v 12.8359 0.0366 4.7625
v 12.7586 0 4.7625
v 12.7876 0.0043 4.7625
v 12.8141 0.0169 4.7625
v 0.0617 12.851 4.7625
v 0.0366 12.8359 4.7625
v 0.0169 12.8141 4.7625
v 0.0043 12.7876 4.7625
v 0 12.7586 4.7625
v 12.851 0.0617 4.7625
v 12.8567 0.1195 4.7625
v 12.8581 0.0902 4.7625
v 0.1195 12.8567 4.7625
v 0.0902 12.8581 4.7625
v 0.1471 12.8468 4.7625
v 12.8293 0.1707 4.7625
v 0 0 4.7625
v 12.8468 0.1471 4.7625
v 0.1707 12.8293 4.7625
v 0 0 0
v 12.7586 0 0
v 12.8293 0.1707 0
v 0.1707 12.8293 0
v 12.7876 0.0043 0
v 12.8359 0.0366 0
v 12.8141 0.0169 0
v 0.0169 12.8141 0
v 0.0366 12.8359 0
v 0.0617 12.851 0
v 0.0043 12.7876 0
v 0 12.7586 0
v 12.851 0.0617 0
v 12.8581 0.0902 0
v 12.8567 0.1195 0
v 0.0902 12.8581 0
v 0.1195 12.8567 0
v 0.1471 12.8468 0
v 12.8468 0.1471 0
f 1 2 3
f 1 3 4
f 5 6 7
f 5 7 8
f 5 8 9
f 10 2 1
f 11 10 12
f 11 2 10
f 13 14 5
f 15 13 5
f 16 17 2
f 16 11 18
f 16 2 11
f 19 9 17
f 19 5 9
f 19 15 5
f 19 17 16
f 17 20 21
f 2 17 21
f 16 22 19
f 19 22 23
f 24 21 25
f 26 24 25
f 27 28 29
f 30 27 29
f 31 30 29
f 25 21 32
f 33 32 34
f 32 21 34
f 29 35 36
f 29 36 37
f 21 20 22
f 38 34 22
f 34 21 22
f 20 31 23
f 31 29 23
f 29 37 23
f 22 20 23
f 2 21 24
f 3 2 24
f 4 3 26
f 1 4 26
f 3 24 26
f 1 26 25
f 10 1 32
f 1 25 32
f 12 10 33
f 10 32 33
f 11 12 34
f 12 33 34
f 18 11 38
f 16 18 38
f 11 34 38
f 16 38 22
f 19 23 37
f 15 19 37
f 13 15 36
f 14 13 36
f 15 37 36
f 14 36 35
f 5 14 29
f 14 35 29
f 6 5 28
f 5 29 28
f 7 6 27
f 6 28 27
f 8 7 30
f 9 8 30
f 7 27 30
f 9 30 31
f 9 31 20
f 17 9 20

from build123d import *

# Parameters (mm, degrees)
BOSS_EXTRUDE1_DEPTH = 4.7625


with BuildPart() as part:
    # Sketch1 → Boss-Extrude1 (new body)
    with BuildSketch(Plane.XY):
        with BuildLine():
            Line((0, 0), (12.758578644, 0))
            ThreePointArc((12.758578644, 0), (12.850966597, 0.061731657), (12.829289322, 0.170710678))
            Line((12.829289322, 0.170710678), (0.170710678, 12.829289322))
            ThreePointArc((0.170710678, 12.829289322), (0.061731657, 12.850966597), (0, 12.758578644))
            Line((0, 12.758578644), (0, 0))
        make_face()
    extrude(amount=BOSS_EXTRUDE1_DEPTH)


solid = part.part
